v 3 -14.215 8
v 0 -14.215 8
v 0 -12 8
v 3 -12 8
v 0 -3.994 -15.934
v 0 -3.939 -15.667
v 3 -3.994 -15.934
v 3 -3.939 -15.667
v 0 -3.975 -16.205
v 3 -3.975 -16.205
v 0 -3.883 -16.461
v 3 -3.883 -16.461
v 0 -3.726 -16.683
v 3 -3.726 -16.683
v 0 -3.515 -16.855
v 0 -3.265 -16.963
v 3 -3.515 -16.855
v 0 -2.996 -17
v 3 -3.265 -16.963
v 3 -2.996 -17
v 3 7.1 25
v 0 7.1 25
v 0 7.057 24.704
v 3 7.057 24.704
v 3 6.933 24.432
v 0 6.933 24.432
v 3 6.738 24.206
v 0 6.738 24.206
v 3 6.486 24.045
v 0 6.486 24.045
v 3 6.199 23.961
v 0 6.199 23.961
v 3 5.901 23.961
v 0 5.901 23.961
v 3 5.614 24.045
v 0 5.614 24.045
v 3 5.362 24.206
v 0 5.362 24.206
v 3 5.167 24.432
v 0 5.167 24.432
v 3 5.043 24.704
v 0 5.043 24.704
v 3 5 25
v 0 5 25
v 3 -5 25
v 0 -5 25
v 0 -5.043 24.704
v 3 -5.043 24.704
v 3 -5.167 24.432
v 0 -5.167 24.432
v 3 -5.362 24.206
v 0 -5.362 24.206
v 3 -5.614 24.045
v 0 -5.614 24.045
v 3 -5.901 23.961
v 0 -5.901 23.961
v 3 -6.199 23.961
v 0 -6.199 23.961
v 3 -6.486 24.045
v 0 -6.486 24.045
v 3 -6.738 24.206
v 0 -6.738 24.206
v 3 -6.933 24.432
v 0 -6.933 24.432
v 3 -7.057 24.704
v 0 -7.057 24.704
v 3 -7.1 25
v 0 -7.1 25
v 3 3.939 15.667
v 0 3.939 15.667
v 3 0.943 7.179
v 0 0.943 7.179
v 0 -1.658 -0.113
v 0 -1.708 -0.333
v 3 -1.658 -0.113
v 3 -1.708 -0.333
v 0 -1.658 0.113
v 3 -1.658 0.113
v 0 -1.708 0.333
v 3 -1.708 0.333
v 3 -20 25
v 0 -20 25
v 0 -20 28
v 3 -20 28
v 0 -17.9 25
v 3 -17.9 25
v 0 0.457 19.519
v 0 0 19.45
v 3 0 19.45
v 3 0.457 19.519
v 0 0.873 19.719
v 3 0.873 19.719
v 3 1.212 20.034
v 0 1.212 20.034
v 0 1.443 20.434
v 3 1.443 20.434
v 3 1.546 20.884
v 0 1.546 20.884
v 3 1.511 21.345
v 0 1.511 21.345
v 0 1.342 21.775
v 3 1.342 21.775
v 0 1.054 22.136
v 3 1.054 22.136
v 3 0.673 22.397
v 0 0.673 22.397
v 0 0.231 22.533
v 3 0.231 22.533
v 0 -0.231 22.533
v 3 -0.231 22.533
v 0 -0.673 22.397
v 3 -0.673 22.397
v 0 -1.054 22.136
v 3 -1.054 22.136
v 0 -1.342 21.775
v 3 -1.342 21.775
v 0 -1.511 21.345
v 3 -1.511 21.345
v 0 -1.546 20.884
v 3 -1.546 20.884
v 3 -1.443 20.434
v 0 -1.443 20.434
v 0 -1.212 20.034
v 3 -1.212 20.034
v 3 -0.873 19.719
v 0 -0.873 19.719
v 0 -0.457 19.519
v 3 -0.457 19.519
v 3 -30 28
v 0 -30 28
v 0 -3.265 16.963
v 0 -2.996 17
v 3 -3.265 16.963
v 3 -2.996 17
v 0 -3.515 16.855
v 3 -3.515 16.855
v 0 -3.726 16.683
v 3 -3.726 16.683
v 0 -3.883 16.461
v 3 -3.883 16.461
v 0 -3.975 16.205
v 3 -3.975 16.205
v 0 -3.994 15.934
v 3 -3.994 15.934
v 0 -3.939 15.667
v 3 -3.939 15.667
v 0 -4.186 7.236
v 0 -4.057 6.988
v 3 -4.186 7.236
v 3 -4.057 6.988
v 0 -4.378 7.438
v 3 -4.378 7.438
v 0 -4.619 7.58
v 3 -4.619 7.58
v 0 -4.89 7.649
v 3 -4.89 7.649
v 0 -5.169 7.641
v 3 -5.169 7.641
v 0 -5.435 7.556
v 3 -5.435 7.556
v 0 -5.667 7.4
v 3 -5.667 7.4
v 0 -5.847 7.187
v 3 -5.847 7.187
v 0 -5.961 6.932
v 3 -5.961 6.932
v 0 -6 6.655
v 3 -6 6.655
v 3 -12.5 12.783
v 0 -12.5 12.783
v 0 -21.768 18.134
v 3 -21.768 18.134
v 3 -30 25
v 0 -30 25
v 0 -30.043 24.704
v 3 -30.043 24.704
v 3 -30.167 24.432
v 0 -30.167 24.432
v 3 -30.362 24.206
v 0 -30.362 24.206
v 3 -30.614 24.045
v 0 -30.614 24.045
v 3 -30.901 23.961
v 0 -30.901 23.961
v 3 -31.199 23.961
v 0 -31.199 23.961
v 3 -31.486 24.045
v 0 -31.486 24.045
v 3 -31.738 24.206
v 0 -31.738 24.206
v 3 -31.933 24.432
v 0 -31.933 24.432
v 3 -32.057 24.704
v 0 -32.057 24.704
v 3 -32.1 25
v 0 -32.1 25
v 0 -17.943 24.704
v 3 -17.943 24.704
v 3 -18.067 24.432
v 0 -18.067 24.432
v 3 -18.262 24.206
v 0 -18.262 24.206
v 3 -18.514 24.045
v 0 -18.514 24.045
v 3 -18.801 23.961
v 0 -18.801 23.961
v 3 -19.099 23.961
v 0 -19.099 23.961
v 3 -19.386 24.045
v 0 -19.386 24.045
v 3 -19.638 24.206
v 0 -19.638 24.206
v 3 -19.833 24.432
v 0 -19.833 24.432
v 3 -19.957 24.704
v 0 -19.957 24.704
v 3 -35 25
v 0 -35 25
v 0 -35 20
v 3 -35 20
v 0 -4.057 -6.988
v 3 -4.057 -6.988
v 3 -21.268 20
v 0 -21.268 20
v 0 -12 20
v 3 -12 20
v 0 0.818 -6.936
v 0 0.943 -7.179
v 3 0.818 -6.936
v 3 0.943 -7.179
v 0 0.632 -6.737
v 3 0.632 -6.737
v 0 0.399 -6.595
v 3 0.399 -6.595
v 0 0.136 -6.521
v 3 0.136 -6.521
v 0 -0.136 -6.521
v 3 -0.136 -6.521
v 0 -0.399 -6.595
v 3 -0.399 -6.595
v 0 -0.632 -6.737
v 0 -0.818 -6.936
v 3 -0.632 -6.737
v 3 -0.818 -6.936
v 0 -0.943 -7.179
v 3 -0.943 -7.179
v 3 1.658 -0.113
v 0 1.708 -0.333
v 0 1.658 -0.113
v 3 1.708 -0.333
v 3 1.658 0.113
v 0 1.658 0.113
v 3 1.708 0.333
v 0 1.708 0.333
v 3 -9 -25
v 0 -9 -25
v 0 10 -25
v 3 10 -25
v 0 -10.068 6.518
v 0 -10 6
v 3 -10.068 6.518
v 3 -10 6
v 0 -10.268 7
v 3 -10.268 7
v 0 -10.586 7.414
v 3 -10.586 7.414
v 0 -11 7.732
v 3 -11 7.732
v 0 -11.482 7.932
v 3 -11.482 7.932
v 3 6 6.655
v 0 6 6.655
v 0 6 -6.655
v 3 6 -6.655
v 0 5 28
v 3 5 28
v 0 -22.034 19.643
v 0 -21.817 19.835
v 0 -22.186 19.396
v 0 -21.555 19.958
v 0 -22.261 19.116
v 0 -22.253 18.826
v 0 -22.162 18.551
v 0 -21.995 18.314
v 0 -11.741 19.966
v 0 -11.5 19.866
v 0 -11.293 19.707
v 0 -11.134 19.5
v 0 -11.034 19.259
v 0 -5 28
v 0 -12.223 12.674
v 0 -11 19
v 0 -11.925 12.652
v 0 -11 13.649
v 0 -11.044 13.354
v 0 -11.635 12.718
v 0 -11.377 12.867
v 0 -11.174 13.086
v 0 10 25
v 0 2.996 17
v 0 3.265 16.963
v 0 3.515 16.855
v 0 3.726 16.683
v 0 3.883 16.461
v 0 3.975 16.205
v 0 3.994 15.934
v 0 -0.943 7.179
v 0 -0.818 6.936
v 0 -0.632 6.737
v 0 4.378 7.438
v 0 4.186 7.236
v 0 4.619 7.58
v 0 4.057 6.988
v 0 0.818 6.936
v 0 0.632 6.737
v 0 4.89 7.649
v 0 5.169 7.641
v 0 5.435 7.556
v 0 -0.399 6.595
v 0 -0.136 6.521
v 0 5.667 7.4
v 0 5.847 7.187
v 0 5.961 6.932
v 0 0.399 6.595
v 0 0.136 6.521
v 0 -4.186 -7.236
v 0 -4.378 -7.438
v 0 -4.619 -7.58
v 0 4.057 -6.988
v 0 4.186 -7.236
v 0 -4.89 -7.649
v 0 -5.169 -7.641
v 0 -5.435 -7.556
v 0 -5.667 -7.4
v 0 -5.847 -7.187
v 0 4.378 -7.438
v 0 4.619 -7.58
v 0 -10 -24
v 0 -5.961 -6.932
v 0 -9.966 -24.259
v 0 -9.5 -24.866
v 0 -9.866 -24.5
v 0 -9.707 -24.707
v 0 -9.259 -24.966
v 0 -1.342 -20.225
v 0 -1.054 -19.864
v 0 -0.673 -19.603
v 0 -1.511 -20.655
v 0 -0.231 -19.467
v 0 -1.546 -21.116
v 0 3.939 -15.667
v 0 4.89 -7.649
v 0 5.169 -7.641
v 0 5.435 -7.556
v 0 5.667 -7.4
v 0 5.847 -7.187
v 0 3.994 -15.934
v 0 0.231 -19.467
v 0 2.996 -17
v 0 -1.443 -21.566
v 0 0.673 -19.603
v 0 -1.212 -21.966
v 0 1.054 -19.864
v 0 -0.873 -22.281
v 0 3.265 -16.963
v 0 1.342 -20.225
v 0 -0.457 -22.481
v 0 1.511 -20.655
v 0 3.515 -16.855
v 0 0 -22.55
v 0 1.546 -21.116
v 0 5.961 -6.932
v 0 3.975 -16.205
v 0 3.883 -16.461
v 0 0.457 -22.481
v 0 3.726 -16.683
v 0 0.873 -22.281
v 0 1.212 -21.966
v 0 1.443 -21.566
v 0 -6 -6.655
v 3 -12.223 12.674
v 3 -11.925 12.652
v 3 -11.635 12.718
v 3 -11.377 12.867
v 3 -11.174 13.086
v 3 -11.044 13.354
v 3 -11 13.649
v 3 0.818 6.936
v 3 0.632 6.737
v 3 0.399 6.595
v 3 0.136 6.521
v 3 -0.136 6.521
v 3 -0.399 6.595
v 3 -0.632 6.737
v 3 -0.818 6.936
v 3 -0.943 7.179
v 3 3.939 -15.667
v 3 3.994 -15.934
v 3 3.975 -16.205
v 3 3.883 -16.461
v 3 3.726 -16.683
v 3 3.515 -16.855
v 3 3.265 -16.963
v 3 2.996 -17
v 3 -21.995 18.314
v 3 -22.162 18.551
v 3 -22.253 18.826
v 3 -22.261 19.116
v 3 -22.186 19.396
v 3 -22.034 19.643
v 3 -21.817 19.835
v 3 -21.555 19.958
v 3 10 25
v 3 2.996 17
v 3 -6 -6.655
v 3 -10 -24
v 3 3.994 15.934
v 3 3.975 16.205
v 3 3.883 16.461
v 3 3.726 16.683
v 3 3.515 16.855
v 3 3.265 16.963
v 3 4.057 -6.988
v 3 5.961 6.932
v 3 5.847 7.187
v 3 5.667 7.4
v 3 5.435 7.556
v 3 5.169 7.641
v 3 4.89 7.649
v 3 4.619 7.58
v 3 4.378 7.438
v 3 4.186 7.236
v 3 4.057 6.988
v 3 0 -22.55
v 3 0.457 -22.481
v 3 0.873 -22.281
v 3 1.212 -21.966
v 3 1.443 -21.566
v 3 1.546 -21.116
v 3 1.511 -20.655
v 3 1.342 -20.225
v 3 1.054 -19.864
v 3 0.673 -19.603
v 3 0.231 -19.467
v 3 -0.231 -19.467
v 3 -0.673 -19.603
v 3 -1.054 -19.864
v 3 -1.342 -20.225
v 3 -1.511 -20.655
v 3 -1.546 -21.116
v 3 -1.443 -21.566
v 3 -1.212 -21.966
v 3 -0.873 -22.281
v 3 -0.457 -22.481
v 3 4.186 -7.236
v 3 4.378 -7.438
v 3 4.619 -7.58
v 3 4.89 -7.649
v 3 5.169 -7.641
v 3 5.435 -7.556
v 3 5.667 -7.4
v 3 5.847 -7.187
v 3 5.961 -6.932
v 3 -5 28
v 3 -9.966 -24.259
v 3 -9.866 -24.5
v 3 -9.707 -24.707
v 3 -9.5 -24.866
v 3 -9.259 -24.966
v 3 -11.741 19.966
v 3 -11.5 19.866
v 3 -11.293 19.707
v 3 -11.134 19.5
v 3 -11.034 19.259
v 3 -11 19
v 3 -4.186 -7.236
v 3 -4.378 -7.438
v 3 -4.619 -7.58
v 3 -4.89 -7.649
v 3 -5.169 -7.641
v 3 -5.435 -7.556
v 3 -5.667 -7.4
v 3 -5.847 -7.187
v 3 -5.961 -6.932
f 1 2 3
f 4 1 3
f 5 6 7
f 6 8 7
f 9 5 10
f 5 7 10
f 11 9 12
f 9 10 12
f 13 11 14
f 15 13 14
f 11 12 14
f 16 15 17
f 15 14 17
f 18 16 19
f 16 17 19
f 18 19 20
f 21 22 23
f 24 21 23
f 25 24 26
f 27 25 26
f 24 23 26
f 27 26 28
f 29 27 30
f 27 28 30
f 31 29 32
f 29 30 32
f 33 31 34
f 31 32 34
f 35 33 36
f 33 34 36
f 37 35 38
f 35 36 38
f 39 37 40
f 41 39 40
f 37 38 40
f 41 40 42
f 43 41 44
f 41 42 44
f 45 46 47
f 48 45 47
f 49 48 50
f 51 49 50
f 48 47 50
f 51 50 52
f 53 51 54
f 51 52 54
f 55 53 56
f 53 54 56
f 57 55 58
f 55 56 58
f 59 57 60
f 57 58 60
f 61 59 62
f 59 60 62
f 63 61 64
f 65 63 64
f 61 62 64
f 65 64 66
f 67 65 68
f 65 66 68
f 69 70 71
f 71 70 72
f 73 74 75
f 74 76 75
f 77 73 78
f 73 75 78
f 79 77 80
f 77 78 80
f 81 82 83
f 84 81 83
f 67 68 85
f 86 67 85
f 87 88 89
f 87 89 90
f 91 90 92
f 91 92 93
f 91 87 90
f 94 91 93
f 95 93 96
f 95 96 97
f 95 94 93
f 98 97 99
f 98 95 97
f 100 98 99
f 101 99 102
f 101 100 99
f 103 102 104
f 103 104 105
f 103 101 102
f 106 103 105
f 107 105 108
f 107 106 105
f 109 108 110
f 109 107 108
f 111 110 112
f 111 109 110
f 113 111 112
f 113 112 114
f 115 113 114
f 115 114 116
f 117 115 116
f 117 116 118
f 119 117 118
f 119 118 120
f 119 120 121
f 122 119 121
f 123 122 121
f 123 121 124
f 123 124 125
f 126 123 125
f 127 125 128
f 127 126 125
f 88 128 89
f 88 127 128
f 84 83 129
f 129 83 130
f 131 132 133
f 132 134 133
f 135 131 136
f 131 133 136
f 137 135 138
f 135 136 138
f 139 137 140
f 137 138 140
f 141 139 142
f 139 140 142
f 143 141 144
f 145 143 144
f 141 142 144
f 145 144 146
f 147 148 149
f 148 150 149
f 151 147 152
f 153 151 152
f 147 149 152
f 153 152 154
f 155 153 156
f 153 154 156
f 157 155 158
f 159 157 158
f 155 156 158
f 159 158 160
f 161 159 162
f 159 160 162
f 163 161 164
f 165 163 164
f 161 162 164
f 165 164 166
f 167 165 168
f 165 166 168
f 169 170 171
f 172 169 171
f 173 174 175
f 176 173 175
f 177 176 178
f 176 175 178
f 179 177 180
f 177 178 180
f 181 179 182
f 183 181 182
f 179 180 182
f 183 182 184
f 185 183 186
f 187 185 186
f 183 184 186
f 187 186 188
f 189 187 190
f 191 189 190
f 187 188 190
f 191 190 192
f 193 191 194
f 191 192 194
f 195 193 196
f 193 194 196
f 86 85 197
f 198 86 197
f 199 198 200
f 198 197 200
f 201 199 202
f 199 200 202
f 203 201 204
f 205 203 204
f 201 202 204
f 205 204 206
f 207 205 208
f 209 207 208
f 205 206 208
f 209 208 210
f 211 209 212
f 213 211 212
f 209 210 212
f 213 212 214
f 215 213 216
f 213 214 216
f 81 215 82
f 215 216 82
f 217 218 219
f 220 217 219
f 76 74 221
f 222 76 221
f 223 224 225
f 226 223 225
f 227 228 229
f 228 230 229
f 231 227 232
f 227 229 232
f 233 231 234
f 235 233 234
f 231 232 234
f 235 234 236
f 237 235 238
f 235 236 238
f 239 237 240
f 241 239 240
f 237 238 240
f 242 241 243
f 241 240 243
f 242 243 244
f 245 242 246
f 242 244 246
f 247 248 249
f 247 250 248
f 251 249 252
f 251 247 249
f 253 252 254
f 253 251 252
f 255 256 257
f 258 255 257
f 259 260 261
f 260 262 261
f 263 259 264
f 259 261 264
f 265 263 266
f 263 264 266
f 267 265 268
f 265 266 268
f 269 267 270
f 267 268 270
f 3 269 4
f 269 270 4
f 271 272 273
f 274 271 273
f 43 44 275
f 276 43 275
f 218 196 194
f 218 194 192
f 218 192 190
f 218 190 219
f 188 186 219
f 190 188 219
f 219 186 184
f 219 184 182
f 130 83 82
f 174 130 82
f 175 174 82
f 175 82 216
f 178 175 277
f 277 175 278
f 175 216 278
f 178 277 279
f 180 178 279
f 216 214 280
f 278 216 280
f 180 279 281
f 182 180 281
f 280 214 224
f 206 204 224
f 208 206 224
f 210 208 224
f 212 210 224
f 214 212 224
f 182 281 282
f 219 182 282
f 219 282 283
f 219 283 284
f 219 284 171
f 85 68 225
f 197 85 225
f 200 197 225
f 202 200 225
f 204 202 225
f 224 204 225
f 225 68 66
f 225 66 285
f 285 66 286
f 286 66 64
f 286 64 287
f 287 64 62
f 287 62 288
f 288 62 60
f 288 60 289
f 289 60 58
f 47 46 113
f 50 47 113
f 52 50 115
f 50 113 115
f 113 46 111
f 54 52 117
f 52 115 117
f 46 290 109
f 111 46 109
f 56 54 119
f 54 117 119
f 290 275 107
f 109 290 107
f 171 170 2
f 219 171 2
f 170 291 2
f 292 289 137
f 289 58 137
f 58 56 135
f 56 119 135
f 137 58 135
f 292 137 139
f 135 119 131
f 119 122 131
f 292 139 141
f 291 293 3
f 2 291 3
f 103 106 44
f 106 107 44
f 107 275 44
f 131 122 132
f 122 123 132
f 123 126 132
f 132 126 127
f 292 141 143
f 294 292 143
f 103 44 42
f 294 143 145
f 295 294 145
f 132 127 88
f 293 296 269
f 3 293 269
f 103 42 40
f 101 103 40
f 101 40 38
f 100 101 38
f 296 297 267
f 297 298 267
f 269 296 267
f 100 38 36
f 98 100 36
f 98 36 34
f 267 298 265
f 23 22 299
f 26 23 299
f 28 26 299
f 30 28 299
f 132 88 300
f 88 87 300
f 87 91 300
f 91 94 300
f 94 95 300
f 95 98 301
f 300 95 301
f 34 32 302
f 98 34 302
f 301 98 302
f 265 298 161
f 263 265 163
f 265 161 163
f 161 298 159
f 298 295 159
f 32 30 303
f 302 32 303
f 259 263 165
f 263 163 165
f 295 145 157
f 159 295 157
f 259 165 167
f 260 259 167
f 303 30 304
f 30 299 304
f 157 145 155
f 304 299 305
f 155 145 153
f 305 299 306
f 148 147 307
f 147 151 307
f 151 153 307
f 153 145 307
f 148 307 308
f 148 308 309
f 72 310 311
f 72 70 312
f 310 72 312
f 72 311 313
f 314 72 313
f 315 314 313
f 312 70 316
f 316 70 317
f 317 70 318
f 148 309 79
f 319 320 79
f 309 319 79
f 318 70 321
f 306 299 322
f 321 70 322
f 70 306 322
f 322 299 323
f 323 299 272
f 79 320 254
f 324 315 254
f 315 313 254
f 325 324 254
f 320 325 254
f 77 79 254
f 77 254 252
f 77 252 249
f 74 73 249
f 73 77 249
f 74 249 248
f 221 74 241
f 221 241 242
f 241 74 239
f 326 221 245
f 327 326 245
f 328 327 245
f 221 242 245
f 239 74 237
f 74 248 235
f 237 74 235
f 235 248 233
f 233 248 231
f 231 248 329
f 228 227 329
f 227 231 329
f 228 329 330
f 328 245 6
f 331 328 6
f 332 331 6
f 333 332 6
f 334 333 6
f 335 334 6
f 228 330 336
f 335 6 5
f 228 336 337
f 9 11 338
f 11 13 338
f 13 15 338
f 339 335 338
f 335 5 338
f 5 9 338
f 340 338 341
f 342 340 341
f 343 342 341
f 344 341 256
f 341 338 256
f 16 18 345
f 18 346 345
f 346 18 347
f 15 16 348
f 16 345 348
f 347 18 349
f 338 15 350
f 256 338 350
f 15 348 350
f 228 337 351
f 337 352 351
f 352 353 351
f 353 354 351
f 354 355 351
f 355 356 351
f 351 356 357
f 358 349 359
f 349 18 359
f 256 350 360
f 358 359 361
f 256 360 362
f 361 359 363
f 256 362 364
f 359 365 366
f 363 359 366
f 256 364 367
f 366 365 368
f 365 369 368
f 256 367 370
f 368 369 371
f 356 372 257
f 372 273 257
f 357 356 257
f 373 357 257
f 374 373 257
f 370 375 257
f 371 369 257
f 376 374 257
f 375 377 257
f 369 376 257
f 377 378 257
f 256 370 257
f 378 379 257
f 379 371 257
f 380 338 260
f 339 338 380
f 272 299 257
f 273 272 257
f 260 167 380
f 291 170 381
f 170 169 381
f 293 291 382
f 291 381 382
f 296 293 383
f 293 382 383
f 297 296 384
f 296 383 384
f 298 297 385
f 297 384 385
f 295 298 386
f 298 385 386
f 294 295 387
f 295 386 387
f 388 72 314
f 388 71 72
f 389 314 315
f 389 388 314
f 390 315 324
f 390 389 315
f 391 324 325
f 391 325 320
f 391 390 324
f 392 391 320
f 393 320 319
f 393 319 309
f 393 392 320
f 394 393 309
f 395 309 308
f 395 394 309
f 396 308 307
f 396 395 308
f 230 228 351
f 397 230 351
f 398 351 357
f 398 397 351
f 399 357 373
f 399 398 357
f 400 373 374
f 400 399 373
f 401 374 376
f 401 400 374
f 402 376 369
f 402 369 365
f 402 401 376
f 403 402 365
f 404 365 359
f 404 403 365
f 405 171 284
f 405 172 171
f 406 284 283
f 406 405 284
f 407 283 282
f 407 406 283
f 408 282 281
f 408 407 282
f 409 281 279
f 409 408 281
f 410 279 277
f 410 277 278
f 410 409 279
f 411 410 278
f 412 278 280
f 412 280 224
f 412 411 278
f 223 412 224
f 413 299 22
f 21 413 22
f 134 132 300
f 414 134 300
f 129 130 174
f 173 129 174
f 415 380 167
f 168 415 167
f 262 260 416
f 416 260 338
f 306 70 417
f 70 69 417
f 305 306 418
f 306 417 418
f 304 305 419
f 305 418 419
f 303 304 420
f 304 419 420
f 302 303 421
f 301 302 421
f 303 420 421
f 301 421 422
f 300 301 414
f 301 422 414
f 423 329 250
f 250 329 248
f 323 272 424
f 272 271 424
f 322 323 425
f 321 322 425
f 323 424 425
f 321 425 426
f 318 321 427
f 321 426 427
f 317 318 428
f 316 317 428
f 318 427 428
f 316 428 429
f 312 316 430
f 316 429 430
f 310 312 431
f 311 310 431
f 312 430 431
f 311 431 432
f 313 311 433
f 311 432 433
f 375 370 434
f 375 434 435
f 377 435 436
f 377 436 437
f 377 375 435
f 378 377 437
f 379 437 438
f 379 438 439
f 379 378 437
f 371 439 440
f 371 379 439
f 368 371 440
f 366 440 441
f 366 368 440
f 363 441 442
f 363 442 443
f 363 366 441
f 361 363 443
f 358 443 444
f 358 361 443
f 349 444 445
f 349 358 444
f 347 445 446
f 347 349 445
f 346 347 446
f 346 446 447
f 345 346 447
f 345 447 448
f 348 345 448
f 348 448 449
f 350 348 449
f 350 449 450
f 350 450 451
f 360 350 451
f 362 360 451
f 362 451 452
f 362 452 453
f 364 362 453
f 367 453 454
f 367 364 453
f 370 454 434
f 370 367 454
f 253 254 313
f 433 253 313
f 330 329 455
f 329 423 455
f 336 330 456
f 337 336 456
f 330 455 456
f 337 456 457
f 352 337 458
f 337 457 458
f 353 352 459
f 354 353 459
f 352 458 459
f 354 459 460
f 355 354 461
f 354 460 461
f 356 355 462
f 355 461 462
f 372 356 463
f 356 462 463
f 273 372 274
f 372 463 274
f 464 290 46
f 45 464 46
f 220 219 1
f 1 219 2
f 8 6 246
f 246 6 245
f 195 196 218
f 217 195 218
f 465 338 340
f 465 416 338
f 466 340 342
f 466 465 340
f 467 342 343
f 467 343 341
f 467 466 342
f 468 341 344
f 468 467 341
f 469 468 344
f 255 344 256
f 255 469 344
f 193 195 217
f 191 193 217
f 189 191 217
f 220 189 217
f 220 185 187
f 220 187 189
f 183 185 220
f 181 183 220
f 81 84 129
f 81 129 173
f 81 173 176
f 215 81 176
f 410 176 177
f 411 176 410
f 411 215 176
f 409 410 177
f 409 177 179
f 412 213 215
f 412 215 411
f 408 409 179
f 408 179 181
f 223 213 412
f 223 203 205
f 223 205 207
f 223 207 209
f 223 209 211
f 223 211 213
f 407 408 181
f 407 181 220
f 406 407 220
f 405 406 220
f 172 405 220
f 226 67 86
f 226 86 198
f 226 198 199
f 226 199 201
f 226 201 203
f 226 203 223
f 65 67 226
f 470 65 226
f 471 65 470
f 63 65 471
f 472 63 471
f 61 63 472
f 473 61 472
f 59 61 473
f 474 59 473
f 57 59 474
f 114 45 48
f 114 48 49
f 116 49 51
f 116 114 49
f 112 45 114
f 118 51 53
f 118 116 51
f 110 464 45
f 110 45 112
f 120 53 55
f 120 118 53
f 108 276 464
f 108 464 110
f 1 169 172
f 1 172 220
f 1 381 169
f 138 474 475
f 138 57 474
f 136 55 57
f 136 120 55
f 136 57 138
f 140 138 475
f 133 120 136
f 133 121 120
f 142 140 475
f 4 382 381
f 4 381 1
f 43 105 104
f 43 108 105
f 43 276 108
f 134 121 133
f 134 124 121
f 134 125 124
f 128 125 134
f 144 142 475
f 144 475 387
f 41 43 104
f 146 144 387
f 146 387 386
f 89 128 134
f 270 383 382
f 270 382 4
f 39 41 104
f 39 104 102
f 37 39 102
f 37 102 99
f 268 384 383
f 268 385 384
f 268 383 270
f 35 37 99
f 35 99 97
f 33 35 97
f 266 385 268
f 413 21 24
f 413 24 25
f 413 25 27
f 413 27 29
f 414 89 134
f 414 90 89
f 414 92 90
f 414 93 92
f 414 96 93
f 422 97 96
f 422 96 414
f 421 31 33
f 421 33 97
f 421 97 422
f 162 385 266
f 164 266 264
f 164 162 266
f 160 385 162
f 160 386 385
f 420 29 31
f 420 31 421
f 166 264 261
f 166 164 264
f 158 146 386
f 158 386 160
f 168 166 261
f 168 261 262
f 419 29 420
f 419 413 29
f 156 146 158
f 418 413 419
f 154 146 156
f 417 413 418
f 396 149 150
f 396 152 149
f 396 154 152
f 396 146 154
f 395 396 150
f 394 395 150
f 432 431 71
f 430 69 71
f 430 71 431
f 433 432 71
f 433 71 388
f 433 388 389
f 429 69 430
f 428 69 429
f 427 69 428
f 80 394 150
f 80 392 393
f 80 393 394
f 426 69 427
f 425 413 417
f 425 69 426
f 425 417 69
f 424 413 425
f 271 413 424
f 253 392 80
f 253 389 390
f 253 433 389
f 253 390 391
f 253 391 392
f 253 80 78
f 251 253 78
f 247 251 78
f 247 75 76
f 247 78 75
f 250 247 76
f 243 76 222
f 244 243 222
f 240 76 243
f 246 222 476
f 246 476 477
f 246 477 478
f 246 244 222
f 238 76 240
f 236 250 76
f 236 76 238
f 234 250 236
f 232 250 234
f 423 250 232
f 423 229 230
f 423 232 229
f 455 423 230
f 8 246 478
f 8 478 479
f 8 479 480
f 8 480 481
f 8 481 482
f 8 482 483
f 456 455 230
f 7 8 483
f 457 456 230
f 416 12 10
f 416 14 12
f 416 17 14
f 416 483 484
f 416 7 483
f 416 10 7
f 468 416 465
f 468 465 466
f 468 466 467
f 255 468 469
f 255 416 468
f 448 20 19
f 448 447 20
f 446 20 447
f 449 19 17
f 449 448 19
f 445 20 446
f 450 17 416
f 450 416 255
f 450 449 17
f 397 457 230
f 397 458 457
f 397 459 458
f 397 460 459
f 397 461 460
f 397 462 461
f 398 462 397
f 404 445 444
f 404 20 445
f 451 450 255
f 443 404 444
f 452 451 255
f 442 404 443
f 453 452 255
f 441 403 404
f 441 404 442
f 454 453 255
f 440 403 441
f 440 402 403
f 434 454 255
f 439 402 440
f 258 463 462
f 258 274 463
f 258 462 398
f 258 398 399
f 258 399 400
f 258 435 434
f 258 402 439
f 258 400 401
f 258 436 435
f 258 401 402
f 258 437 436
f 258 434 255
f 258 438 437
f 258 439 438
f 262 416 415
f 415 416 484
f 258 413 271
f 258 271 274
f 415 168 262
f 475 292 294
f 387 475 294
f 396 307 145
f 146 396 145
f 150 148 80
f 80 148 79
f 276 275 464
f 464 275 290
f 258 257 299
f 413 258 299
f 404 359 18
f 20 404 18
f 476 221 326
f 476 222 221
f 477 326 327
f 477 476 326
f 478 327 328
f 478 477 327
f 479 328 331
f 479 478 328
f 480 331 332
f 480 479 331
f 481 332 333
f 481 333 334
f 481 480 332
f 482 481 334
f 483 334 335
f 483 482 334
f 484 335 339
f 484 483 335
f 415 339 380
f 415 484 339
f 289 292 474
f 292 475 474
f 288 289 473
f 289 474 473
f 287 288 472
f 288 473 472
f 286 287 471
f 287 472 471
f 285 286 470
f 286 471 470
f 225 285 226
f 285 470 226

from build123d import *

# Parameters (mm, degrees)
SKETCH_1_R      = 1.55
EXTRUDE_1_DEPTH = 3
FILLET_1_R      = 1
FILLET_2_R      = 2


with BuildPart() as part:
    # 草图1 → 凸台-拉伸1 (new body)
    with BuildSketch(Plane(origin=(0, 0, 0), x_dir=(0, 0, -1), z_dir=(1, 0, 0))):
        with BuildLine():
            Line((-8, -10), (25, -10))
            Line((25, -10), (25, 10))
            Line((25, 10), (-25, 10))
            Line((-25, 10), (-25, 7.1))
            ThreePointArc((-25, 7.1), (-23.95, 6.05), (-25, 5))
            Line((-25, 5), (-28, 5))
            Line((-28, 5), (-28, -5))
            Line((-28, -5), (-25, -5))
            ThreePointArc((-25, -5), (-23.95, -6.05), (-25, -7.1))
            Line((-25, -7.1), (-25, -17.9))
            ThreePointArc((-25, -17.9), (-23.95, -18.95), (-25, -20))
            Line((-25, -20), (-28, -20))
            Line((-28, -20), (-28, -30))
            Line((-28, -30), (-25, -30))
            ThreePointArc((-25, -30), (-23.95, -31.05), (-25, -32.1))
            Line((-25, -32.1), (-25, -35))
            Line((-25, -35), (-20, -35))
            Line((-20, -35), (-8, -14.215390309))
            Line((-8, -14.215390309), (-8, -10))
        make_face()
        with Locations((-21, 0)):
            Circle(SKETCH_1_R, mode=Mode.SUBTRACT)
        Polygon((-4.506939094, 0), (-17, -4.409315614), (-17, 4.409315614), align=None, mode=Mode.SUBTRACT)
        Polygon((12.493060906, -6), (-12.493060906, -6), (0, -1.590684386), align=None, mode=Mode.SUBTRACT)
        Polygon((0, 1.590684386), (-12.493060906, 6), (12.493060906, 6), align=None, mode=Mode.SUBTRACT)
        Polygon((17, 4.409315614), (17, -4.409315614), (4.506939094, 0), align=None, mode=Mode.SUBTRACT)
        with Locations((21, 0)):
            Circle(SKETCH_1_R, mode=Mode.SUBTRACT)
        Polygon((-20, -25), (-20, -11), (-11.917096231, -11), align=None, mode=Mode.SUBTRACT)
    extrude(amount=EXTRUDE_1_DEPTH)

    # 圆角1
    fillet_1_edges = [part.edges().sort_by_distance(p)[0] for p in [
        (1.5, -11, 20),
        (1.5, -25, 20),
        (1.5, -11, 11.917096231),
        (1.5, 6, -12.493060906),
        (1.5, 6, 12.493060906),
        (1.5, 1.590684386, 0),
        (1.5, -4.409315614, 17),
        (1.5, 0, 4.506939094),
        (1.5, 4.409315614, 17),
        (1.5, -4.409315614, -17),
        (1.5, 4.409315614, -17),
        (1.5, 0, -4.506939094),
        (1.5, -6, 12.493060906),
        (1.5, -6, -12.493060906),
        (1.5, -1.590684386, 0),
        (1.5, -10, -25),
    ]]
    fillet(fillet_1_edges, radius=FILLET_1_R)

    # 圆角2
    fillet_2_edges = [part.edges().sort_by_distance(p)[0] for p in [
        (1.5, -10, 8),
    ]]
    fillet(fillet_2_edges, radius=FILLET_2_R)


solid = part.part
